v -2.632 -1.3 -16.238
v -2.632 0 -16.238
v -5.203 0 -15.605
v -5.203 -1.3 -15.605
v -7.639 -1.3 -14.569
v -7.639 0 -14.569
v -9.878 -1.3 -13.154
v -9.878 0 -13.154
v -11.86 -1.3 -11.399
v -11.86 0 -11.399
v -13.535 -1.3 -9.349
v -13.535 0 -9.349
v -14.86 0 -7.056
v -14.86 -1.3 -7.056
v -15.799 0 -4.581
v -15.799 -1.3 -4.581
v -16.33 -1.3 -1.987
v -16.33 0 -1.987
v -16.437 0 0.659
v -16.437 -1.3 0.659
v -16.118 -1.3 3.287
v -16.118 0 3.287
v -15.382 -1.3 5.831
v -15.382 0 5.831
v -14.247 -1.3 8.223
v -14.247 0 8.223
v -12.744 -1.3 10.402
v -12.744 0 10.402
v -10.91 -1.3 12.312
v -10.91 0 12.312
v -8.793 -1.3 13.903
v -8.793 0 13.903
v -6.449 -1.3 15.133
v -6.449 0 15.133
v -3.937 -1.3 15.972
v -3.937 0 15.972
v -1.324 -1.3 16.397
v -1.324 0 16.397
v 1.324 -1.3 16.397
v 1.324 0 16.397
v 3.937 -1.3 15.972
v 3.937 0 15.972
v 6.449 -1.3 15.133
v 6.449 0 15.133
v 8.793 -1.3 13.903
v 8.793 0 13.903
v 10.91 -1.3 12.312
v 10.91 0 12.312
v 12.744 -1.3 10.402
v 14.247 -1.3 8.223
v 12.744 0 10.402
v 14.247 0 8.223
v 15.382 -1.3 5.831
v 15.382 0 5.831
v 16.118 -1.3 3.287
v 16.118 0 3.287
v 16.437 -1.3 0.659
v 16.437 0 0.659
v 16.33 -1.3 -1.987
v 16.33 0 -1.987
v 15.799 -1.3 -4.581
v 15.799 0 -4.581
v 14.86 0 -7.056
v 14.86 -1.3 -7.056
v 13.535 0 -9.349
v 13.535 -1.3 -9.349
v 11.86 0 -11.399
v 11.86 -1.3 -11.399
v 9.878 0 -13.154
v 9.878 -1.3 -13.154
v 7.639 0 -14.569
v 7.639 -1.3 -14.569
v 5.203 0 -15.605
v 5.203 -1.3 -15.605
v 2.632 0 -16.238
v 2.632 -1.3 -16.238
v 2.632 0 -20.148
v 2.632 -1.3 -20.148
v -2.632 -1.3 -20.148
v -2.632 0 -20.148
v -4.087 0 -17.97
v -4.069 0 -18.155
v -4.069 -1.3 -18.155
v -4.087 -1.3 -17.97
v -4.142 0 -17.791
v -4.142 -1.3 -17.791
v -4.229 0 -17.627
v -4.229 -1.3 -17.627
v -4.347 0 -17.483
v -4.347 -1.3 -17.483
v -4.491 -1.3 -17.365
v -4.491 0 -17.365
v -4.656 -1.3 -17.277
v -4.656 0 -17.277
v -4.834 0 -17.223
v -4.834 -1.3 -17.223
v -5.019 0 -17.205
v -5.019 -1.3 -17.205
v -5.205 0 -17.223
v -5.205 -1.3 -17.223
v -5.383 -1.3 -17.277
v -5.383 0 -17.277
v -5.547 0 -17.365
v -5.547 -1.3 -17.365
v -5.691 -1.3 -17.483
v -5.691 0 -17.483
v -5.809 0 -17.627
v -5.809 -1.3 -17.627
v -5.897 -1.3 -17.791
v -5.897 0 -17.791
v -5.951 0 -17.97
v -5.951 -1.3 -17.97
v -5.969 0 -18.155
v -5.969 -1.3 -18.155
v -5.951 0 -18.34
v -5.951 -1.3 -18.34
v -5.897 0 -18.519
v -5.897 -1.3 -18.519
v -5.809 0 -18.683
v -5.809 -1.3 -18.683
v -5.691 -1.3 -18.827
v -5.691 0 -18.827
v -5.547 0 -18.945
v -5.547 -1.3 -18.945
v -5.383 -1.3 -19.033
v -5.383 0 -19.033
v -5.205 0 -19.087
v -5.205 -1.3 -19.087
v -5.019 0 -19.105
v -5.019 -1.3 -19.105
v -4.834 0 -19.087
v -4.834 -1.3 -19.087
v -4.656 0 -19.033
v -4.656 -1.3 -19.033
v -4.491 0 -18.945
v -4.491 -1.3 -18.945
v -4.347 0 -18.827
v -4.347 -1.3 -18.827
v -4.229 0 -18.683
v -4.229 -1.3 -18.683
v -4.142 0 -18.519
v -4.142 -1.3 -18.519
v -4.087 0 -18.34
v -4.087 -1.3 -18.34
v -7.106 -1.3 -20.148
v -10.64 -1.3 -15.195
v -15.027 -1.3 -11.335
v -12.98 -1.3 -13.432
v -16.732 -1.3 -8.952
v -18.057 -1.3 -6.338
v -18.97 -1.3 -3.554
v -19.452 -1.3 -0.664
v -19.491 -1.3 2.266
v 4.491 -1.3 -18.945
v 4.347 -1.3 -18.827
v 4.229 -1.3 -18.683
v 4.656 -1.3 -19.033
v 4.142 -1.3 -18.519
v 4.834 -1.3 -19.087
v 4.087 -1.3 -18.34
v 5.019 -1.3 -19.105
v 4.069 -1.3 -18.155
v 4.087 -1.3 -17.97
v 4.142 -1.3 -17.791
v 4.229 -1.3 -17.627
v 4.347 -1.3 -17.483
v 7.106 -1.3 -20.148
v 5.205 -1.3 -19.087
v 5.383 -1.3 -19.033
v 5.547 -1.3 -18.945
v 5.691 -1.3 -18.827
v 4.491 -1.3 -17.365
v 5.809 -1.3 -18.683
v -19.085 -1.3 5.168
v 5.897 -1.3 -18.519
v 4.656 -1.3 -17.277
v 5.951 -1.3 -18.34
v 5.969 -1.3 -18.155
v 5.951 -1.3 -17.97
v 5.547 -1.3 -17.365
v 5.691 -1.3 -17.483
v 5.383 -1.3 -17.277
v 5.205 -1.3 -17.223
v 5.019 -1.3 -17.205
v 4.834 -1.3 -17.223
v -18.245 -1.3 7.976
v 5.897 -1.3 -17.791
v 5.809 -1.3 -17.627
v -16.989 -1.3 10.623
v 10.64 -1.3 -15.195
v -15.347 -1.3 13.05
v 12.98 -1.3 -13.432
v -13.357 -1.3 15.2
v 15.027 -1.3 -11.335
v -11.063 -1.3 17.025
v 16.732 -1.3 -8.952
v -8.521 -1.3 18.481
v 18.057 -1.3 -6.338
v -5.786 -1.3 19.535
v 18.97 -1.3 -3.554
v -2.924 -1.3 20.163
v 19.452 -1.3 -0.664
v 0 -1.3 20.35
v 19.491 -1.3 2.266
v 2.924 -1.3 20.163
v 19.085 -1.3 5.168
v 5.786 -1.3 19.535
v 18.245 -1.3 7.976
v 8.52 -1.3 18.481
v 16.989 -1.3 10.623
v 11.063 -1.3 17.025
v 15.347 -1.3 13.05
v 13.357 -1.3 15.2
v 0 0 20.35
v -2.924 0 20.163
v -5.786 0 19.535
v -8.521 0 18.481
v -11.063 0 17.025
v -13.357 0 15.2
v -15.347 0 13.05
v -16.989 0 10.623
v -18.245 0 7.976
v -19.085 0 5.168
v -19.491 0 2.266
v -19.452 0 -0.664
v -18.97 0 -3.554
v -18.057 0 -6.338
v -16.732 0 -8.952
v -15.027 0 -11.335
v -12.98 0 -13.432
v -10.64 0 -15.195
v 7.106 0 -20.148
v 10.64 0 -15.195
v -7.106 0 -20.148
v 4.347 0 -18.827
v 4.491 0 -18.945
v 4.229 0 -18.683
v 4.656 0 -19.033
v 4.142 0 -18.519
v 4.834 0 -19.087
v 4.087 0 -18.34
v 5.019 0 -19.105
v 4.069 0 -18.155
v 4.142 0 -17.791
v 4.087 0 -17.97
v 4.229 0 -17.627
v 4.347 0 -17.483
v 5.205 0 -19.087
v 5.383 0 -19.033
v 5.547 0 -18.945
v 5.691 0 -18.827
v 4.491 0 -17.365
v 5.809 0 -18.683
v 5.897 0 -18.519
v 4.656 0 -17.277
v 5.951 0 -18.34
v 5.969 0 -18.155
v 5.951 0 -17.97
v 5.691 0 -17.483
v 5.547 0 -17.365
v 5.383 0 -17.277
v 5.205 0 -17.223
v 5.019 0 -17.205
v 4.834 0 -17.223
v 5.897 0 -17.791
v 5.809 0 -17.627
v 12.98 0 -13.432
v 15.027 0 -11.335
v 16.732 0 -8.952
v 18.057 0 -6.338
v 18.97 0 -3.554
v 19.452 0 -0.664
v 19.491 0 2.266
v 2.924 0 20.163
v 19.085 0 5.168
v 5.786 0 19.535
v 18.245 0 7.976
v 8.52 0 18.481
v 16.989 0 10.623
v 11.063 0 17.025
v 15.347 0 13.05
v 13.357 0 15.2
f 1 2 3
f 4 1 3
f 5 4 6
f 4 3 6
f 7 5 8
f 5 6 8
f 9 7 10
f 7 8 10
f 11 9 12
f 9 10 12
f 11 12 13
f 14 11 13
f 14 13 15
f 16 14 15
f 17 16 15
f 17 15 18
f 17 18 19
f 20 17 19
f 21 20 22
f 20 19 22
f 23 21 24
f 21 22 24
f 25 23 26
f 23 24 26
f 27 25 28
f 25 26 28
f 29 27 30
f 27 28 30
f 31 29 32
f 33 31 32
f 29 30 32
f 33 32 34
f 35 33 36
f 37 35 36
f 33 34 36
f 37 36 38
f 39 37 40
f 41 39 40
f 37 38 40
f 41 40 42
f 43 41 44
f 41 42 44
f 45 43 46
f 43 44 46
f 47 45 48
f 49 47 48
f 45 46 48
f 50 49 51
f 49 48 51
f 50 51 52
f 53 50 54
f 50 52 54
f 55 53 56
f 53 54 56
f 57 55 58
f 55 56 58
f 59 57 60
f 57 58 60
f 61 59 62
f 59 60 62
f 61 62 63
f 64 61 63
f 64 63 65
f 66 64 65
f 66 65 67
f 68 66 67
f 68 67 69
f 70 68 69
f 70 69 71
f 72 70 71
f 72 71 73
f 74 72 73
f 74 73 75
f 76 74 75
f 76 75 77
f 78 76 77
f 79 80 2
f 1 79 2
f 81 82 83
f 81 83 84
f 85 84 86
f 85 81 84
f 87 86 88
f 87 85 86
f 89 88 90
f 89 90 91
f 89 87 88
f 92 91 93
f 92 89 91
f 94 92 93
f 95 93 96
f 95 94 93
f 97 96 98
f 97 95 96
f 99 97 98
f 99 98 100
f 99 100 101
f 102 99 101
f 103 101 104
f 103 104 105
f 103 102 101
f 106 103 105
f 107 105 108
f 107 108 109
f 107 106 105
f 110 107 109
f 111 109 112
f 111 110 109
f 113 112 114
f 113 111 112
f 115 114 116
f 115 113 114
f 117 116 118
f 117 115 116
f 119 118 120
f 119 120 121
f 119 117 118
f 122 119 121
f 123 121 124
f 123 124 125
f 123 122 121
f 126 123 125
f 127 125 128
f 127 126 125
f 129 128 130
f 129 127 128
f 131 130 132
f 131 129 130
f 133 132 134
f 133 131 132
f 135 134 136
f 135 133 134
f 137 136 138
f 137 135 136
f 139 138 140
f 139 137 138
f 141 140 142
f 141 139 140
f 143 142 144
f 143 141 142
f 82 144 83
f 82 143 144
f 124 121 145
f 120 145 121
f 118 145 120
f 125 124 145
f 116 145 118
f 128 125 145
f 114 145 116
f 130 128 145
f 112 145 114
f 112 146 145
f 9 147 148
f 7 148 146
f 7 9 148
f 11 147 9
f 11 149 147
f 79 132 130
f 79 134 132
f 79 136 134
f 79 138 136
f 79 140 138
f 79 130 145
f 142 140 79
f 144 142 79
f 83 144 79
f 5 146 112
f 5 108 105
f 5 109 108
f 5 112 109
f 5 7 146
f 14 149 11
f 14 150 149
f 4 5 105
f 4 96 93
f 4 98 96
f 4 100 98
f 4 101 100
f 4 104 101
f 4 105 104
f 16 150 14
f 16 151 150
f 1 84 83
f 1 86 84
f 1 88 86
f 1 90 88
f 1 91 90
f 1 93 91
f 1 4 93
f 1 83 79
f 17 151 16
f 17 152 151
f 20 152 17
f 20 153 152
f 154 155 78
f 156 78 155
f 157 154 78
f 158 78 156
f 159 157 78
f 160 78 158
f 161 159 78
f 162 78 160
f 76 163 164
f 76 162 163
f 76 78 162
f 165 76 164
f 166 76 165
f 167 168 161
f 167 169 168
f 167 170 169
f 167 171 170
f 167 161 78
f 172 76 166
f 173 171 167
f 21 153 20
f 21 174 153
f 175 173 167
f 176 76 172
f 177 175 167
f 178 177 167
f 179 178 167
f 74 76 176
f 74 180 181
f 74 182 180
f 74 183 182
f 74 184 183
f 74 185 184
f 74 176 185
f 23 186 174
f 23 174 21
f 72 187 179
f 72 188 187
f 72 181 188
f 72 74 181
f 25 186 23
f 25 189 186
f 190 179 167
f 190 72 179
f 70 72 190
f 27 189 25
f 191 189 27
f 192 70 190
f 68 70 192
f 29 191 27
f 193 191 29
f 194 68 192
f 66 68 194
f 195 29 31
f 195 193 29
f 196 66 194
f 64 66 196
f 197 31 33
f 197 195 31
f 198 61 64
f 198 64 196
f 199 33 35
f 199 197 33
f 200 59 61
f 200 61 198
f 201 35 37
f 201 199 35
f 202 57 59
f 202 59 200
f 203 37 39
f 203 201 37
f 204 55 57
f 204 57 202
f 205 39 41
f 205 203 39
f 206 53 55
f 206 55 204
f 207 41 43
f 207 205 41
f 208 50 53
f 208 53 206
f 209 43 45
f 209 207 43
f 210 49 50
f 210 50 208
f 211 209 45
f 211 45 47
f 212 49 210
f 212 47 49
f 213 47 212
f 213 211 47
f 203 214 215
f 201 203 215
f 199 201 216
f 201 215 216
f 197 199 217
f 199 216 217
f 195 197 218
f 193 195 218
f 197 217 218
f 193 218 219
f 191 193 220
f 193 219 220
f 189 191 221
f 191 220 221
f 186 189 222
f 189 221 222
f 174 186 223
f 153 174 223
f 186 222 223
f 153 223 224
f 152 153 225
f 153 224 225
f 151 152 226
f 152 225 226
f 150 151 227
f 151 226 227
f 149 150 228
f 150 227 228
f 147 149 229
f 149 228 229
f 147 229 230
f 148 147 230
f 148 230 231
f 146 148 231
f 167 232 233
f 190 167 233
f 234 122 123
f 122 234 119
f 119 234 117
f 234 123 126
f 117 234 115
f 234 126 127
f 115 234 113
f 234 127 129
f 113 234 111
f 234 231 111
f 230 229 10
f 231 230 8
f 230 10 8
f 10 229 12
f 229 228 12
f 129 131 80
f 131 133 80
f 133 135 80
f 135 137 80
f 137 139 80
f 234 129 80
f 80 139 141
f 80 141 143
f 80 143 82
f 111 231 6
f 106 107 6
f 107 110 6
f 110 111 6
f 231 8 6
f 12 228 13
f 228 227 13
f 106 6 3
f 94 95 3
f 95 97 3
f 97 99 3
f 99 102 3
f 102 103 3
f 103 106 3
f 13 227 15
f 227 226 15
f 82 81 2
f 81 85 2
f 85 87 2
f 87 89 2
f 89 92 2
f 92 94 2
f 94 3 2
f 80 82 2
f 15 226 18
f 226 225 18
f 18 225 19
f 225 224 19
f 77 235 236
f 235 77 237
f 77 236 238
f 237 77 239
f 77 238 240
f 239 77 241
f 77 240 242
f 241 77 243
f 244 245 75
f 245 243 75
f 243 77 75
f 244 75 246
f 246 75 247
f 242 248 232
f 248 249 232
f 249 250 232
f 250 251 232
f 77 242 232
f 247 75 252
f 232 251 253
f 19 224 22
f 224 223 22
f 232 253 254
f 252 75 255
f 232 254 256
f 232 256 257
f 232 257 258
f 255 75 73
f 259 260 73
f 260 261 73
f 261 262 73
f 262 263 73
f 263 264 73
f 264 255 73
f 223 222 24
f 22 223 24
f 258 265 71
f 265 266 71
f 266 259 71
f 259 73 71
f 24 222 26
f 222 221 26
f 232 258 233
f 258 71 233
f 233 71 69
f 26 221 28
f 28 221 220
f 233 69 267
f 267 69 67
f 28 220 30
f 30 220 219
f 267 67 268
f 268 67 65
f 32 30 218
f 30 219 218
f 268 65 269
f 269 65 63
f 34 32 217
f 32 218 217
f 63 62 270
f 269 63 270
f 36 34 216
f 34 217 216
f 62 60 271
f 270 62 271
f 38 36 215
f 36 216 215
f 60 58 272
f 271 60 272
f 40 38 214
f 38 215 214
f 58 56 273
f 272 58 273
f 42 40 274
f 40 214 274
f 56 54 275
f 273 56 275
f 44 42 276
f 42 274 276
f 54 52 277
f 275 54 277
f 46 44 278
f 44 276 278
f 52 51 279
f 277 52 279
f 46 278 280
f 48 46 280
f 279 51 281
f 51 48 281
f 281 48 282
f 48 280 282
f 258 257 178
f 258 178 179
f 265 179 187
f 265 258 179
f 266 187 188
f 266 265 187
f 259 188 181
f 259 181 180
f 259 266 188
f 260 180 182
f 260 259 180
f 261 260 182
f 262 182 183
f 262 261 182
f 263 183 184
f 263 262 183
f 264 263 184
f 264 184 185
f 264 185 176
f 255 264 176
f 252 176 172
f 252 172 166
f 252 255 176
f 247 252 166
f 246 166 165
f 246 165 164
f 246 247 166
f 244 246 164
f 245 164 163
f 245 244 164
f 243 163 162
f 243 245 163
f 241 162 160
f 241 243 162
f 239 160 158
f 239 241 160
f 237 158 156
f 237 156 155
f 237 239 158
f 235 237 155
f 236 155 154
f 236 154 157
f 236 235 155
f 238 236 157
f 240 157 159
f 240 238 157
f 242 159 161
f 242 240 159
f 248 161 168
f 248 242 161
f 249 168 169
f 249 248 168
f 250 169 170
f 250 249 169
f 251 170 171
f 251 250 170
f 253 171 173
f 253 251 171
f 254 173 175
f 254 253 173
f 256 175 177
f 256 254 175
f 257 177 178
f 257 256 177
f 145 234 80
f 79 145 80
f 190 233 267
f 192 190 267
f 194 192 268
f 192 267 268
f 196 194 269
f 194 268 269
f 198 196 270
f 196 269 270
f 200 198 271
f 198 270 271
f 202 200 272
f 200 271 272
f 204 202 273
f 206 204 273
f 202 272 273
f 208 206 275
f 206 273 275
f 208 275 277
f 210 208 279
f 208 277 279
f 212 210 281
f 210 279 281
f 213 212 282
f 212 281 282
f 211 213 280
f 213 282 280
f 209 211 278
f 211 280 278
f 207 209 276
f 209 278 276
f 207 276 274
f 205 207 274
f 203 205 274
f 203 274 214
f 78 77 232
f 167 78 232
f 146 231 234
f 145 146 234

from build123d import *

# Parameters (mm, degrees)
F0_R     = 0.95
F1_DEPTH = 1.3


# Not quite as in the source:
# - ends of sketch curves that miss each other by under 0.0002 mm in the source are joined


with BuildPart() as f1:
    # F0 (on Front) → F1 (new body)
    with BuildSketch(Plane.XZ):
        with BuildLine():
            ThreePointArc((-2.631999982, -16.2380748888), (2.5478e-06, 16.45), (2.631994952, -16.2380757041))
            Line((2.631994952, -16.2380757041), (2.632, -20.148075))
            Line((2.632, -20.148075), (7.1064, -20.148075))
            Line((7.1064, -20.148075), (10.639843, -15.19527))
            ThreePointArc((10.639843, -15.19527), (18.7183878017, 6.5879564678), (-5.9926e-06, 20.349999387))
            ThreePointArc((-5.9926e-06, 20.349999387), (-18.7183877489, 6.5879566442), (-10.6398432665, -15.1952704161))
            Line((-10.6398432665, -15.1952704161), (-7.1064, -20.148075))
            Line((-7.1064, -20.148075), (-2.632, -20.148075))
            Line((-2.632, -20.148075), (-2.631999982, -16.2380748888))
        make_face()
        with Locations((-5.0192, -18.155)):
            Circle(F0_R, mode=Mode.SUBTRACT)
        with Locations((5.0192, -18.155)):
            Circle(F0_R, mode=Mode.SUBTRACT)
    extrude(amount=F1_DEPTH)


solid = f1.part
